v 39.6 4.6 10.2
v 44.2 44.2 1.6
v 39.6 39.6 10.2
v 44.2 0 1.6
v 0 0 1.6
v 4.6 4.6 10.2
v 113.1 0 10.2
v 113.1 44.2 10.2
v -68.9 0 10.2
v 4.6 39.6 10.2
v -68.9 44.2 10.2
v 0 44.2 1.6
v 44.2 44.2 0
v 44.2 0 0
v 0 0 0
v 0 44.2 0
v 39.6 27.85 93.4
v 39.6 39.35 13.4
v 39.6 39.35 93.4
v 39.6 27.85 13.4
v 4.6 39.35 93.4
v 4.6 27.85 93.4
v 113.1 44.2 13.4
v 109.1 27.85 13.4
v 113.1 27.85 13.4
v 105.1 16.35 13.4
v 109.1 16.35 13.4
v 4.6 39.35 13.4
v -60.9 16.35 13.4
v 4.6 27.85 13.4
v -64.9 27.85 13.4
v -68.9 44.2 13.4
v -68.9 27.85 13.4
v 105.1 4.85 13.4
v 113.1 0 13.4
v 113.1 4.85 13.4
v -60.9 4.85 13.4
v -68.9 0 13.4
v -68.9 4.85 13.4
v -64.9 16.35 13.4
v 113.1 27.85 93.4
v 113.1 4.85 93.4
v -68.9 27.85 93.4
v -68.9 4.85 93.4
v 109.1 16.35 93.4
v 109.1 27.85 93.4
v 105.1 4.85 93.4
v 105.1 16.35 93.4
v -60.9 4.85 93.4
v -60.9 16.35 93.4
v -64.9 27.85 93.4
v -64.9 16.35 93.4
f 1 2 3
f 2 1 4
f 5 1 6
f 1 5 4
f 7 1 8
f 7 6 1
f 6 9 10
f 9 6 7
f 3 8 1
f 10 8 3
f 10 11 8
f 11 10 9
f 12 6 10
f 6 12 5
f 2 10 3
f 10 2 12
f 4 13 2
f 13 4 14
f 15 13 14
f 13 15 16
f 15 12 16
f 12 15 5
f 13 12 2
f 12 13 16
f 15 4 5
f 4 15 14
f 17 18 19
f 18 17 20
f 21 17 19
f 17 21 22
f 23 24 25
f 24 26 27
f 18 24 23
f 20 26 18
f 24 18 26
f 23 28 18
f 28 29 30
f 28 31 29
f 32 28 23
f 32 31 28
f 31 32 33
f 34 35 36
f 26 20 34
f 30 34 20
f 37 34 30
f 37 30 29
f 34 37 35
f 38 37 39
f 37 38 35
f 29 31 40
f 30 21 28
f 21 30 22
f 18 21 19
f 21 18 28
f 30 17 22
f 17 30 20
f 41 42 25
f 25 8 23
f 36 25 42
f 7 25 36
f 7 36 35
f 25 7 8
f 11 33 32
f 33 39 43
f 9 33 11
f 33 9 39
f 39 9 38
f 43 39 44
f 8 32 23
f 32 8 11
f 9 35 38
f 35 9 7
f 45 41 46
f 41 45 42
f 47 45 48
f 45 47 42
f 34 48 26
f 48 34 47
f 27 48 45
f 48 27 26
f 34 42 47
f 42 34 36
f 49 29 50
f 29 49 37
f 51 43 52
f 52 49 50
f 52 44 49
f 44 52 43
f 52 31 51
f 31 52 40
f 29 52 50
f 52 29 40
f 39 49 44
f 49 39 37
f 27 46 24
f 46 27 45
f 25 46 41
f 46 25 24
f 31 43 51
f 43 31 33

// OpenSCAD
t=44.2; //Tiefe Basis
b=44.2; //Breite Basis
t2=35; //Tiefe Oben
b2=35; //Breite Oben

td=(t-t2)/2;
bd=(b-b2)/2;

ht=10.2; //Höhe Total
hb=1.6; //Höhe unterer Cubus
ho=ht-hb; //Höhe oben (polyhedron)

//plattendicke
pd=3.2;

CubePoints = [
  [  0,  0,  0 ],  //0
  [ b,  0,  0 ],  //1
  [ b,  t,  0 ],  //2
  [  0,  t,  0 ],  //3
  [  bd,  bd,  ho ],  //4
  [ t-bd,  bd,  ho ],  //5
  [ t-bd,  t-bd,  ho ],  //6
  [  bd,  t-bd,  ho ]]; //7
  
CubeFaces = [
  [0,1,2,3],  // bottom
  [4,5,1,0],  // front
  [7,6,5,4],  // top
  [5,6,2,1],  // right
  [6,7,3,2],  // back
  [7,4,0,3]]; // left

module tripod()
{
translate([0,0,hb])  
polyhedron( CubePoints, CubeFaces );

cube([t,b,hb]);
}

//Handy

hh=174.0; //Höhe Handy
bh=80; //Breite Handy
th=11.5; //Tiefe gemessen 9.4, Laut Hersteller nur 8.0

module handy()
{
    color("silver")
    translate([(b-hh)/2,(t-th)/2,ht+pd])
    cube([hh,th,bh]);
}

module vorne()
{
    translate([bd,(t-th)/2-th,ht+pd])
    cube([b2,th,bh]);
}

module hinten()
{
    translate([bd,(t-th)/2+th,ht+pd])
    cube([b2,th,bh]);
}

module stabilisator()
{
    cube([b2,(t-th)/2-th-td,ht]);
}

module stabilisatoren()
{
    translate([bd,td,ht])
    stabilisator();
    
    translate([bd,(t-th)/2+th*2,ht])
    stabilisator();
}

module platte_laptop()
{
translate([-t*3/2+b/2,-t*3/2+t/2,ht])
cube([t*3,t*3,pd]);
}

module platte_rogphone()
{
    color("#AAAAFF")
translate([-hh/2+b/2-dv,-t/2+t/2,ht])
cube([hh+dv*2,t,pd]);
}

//dicke_vorne
dv=4;

module vorne_rechts()
{
    translate([b+hh/2-b/2-dv,(t-th)/2-th,ht+pd])
    cube([dv,th,bh]);
}

module vorne_links()
{
    translate([-hh/2+b/2,(t-th)/2-th,ht+pd])
    cube([dv,th,bh]);
}

tripod();

//handy();
//vorne();
hinten();
//stabilisatoren();
//platte_laptop();
platte_rogphone();
vorne_rechts();
vorne_links();

translate([dv,0,0])
vorne_rechts();
translate([dv,th,0])
vorne_rechts();

translate([-dv,0,0])
vorne_links();
translate([-dv,th,0])
vorne_links();
